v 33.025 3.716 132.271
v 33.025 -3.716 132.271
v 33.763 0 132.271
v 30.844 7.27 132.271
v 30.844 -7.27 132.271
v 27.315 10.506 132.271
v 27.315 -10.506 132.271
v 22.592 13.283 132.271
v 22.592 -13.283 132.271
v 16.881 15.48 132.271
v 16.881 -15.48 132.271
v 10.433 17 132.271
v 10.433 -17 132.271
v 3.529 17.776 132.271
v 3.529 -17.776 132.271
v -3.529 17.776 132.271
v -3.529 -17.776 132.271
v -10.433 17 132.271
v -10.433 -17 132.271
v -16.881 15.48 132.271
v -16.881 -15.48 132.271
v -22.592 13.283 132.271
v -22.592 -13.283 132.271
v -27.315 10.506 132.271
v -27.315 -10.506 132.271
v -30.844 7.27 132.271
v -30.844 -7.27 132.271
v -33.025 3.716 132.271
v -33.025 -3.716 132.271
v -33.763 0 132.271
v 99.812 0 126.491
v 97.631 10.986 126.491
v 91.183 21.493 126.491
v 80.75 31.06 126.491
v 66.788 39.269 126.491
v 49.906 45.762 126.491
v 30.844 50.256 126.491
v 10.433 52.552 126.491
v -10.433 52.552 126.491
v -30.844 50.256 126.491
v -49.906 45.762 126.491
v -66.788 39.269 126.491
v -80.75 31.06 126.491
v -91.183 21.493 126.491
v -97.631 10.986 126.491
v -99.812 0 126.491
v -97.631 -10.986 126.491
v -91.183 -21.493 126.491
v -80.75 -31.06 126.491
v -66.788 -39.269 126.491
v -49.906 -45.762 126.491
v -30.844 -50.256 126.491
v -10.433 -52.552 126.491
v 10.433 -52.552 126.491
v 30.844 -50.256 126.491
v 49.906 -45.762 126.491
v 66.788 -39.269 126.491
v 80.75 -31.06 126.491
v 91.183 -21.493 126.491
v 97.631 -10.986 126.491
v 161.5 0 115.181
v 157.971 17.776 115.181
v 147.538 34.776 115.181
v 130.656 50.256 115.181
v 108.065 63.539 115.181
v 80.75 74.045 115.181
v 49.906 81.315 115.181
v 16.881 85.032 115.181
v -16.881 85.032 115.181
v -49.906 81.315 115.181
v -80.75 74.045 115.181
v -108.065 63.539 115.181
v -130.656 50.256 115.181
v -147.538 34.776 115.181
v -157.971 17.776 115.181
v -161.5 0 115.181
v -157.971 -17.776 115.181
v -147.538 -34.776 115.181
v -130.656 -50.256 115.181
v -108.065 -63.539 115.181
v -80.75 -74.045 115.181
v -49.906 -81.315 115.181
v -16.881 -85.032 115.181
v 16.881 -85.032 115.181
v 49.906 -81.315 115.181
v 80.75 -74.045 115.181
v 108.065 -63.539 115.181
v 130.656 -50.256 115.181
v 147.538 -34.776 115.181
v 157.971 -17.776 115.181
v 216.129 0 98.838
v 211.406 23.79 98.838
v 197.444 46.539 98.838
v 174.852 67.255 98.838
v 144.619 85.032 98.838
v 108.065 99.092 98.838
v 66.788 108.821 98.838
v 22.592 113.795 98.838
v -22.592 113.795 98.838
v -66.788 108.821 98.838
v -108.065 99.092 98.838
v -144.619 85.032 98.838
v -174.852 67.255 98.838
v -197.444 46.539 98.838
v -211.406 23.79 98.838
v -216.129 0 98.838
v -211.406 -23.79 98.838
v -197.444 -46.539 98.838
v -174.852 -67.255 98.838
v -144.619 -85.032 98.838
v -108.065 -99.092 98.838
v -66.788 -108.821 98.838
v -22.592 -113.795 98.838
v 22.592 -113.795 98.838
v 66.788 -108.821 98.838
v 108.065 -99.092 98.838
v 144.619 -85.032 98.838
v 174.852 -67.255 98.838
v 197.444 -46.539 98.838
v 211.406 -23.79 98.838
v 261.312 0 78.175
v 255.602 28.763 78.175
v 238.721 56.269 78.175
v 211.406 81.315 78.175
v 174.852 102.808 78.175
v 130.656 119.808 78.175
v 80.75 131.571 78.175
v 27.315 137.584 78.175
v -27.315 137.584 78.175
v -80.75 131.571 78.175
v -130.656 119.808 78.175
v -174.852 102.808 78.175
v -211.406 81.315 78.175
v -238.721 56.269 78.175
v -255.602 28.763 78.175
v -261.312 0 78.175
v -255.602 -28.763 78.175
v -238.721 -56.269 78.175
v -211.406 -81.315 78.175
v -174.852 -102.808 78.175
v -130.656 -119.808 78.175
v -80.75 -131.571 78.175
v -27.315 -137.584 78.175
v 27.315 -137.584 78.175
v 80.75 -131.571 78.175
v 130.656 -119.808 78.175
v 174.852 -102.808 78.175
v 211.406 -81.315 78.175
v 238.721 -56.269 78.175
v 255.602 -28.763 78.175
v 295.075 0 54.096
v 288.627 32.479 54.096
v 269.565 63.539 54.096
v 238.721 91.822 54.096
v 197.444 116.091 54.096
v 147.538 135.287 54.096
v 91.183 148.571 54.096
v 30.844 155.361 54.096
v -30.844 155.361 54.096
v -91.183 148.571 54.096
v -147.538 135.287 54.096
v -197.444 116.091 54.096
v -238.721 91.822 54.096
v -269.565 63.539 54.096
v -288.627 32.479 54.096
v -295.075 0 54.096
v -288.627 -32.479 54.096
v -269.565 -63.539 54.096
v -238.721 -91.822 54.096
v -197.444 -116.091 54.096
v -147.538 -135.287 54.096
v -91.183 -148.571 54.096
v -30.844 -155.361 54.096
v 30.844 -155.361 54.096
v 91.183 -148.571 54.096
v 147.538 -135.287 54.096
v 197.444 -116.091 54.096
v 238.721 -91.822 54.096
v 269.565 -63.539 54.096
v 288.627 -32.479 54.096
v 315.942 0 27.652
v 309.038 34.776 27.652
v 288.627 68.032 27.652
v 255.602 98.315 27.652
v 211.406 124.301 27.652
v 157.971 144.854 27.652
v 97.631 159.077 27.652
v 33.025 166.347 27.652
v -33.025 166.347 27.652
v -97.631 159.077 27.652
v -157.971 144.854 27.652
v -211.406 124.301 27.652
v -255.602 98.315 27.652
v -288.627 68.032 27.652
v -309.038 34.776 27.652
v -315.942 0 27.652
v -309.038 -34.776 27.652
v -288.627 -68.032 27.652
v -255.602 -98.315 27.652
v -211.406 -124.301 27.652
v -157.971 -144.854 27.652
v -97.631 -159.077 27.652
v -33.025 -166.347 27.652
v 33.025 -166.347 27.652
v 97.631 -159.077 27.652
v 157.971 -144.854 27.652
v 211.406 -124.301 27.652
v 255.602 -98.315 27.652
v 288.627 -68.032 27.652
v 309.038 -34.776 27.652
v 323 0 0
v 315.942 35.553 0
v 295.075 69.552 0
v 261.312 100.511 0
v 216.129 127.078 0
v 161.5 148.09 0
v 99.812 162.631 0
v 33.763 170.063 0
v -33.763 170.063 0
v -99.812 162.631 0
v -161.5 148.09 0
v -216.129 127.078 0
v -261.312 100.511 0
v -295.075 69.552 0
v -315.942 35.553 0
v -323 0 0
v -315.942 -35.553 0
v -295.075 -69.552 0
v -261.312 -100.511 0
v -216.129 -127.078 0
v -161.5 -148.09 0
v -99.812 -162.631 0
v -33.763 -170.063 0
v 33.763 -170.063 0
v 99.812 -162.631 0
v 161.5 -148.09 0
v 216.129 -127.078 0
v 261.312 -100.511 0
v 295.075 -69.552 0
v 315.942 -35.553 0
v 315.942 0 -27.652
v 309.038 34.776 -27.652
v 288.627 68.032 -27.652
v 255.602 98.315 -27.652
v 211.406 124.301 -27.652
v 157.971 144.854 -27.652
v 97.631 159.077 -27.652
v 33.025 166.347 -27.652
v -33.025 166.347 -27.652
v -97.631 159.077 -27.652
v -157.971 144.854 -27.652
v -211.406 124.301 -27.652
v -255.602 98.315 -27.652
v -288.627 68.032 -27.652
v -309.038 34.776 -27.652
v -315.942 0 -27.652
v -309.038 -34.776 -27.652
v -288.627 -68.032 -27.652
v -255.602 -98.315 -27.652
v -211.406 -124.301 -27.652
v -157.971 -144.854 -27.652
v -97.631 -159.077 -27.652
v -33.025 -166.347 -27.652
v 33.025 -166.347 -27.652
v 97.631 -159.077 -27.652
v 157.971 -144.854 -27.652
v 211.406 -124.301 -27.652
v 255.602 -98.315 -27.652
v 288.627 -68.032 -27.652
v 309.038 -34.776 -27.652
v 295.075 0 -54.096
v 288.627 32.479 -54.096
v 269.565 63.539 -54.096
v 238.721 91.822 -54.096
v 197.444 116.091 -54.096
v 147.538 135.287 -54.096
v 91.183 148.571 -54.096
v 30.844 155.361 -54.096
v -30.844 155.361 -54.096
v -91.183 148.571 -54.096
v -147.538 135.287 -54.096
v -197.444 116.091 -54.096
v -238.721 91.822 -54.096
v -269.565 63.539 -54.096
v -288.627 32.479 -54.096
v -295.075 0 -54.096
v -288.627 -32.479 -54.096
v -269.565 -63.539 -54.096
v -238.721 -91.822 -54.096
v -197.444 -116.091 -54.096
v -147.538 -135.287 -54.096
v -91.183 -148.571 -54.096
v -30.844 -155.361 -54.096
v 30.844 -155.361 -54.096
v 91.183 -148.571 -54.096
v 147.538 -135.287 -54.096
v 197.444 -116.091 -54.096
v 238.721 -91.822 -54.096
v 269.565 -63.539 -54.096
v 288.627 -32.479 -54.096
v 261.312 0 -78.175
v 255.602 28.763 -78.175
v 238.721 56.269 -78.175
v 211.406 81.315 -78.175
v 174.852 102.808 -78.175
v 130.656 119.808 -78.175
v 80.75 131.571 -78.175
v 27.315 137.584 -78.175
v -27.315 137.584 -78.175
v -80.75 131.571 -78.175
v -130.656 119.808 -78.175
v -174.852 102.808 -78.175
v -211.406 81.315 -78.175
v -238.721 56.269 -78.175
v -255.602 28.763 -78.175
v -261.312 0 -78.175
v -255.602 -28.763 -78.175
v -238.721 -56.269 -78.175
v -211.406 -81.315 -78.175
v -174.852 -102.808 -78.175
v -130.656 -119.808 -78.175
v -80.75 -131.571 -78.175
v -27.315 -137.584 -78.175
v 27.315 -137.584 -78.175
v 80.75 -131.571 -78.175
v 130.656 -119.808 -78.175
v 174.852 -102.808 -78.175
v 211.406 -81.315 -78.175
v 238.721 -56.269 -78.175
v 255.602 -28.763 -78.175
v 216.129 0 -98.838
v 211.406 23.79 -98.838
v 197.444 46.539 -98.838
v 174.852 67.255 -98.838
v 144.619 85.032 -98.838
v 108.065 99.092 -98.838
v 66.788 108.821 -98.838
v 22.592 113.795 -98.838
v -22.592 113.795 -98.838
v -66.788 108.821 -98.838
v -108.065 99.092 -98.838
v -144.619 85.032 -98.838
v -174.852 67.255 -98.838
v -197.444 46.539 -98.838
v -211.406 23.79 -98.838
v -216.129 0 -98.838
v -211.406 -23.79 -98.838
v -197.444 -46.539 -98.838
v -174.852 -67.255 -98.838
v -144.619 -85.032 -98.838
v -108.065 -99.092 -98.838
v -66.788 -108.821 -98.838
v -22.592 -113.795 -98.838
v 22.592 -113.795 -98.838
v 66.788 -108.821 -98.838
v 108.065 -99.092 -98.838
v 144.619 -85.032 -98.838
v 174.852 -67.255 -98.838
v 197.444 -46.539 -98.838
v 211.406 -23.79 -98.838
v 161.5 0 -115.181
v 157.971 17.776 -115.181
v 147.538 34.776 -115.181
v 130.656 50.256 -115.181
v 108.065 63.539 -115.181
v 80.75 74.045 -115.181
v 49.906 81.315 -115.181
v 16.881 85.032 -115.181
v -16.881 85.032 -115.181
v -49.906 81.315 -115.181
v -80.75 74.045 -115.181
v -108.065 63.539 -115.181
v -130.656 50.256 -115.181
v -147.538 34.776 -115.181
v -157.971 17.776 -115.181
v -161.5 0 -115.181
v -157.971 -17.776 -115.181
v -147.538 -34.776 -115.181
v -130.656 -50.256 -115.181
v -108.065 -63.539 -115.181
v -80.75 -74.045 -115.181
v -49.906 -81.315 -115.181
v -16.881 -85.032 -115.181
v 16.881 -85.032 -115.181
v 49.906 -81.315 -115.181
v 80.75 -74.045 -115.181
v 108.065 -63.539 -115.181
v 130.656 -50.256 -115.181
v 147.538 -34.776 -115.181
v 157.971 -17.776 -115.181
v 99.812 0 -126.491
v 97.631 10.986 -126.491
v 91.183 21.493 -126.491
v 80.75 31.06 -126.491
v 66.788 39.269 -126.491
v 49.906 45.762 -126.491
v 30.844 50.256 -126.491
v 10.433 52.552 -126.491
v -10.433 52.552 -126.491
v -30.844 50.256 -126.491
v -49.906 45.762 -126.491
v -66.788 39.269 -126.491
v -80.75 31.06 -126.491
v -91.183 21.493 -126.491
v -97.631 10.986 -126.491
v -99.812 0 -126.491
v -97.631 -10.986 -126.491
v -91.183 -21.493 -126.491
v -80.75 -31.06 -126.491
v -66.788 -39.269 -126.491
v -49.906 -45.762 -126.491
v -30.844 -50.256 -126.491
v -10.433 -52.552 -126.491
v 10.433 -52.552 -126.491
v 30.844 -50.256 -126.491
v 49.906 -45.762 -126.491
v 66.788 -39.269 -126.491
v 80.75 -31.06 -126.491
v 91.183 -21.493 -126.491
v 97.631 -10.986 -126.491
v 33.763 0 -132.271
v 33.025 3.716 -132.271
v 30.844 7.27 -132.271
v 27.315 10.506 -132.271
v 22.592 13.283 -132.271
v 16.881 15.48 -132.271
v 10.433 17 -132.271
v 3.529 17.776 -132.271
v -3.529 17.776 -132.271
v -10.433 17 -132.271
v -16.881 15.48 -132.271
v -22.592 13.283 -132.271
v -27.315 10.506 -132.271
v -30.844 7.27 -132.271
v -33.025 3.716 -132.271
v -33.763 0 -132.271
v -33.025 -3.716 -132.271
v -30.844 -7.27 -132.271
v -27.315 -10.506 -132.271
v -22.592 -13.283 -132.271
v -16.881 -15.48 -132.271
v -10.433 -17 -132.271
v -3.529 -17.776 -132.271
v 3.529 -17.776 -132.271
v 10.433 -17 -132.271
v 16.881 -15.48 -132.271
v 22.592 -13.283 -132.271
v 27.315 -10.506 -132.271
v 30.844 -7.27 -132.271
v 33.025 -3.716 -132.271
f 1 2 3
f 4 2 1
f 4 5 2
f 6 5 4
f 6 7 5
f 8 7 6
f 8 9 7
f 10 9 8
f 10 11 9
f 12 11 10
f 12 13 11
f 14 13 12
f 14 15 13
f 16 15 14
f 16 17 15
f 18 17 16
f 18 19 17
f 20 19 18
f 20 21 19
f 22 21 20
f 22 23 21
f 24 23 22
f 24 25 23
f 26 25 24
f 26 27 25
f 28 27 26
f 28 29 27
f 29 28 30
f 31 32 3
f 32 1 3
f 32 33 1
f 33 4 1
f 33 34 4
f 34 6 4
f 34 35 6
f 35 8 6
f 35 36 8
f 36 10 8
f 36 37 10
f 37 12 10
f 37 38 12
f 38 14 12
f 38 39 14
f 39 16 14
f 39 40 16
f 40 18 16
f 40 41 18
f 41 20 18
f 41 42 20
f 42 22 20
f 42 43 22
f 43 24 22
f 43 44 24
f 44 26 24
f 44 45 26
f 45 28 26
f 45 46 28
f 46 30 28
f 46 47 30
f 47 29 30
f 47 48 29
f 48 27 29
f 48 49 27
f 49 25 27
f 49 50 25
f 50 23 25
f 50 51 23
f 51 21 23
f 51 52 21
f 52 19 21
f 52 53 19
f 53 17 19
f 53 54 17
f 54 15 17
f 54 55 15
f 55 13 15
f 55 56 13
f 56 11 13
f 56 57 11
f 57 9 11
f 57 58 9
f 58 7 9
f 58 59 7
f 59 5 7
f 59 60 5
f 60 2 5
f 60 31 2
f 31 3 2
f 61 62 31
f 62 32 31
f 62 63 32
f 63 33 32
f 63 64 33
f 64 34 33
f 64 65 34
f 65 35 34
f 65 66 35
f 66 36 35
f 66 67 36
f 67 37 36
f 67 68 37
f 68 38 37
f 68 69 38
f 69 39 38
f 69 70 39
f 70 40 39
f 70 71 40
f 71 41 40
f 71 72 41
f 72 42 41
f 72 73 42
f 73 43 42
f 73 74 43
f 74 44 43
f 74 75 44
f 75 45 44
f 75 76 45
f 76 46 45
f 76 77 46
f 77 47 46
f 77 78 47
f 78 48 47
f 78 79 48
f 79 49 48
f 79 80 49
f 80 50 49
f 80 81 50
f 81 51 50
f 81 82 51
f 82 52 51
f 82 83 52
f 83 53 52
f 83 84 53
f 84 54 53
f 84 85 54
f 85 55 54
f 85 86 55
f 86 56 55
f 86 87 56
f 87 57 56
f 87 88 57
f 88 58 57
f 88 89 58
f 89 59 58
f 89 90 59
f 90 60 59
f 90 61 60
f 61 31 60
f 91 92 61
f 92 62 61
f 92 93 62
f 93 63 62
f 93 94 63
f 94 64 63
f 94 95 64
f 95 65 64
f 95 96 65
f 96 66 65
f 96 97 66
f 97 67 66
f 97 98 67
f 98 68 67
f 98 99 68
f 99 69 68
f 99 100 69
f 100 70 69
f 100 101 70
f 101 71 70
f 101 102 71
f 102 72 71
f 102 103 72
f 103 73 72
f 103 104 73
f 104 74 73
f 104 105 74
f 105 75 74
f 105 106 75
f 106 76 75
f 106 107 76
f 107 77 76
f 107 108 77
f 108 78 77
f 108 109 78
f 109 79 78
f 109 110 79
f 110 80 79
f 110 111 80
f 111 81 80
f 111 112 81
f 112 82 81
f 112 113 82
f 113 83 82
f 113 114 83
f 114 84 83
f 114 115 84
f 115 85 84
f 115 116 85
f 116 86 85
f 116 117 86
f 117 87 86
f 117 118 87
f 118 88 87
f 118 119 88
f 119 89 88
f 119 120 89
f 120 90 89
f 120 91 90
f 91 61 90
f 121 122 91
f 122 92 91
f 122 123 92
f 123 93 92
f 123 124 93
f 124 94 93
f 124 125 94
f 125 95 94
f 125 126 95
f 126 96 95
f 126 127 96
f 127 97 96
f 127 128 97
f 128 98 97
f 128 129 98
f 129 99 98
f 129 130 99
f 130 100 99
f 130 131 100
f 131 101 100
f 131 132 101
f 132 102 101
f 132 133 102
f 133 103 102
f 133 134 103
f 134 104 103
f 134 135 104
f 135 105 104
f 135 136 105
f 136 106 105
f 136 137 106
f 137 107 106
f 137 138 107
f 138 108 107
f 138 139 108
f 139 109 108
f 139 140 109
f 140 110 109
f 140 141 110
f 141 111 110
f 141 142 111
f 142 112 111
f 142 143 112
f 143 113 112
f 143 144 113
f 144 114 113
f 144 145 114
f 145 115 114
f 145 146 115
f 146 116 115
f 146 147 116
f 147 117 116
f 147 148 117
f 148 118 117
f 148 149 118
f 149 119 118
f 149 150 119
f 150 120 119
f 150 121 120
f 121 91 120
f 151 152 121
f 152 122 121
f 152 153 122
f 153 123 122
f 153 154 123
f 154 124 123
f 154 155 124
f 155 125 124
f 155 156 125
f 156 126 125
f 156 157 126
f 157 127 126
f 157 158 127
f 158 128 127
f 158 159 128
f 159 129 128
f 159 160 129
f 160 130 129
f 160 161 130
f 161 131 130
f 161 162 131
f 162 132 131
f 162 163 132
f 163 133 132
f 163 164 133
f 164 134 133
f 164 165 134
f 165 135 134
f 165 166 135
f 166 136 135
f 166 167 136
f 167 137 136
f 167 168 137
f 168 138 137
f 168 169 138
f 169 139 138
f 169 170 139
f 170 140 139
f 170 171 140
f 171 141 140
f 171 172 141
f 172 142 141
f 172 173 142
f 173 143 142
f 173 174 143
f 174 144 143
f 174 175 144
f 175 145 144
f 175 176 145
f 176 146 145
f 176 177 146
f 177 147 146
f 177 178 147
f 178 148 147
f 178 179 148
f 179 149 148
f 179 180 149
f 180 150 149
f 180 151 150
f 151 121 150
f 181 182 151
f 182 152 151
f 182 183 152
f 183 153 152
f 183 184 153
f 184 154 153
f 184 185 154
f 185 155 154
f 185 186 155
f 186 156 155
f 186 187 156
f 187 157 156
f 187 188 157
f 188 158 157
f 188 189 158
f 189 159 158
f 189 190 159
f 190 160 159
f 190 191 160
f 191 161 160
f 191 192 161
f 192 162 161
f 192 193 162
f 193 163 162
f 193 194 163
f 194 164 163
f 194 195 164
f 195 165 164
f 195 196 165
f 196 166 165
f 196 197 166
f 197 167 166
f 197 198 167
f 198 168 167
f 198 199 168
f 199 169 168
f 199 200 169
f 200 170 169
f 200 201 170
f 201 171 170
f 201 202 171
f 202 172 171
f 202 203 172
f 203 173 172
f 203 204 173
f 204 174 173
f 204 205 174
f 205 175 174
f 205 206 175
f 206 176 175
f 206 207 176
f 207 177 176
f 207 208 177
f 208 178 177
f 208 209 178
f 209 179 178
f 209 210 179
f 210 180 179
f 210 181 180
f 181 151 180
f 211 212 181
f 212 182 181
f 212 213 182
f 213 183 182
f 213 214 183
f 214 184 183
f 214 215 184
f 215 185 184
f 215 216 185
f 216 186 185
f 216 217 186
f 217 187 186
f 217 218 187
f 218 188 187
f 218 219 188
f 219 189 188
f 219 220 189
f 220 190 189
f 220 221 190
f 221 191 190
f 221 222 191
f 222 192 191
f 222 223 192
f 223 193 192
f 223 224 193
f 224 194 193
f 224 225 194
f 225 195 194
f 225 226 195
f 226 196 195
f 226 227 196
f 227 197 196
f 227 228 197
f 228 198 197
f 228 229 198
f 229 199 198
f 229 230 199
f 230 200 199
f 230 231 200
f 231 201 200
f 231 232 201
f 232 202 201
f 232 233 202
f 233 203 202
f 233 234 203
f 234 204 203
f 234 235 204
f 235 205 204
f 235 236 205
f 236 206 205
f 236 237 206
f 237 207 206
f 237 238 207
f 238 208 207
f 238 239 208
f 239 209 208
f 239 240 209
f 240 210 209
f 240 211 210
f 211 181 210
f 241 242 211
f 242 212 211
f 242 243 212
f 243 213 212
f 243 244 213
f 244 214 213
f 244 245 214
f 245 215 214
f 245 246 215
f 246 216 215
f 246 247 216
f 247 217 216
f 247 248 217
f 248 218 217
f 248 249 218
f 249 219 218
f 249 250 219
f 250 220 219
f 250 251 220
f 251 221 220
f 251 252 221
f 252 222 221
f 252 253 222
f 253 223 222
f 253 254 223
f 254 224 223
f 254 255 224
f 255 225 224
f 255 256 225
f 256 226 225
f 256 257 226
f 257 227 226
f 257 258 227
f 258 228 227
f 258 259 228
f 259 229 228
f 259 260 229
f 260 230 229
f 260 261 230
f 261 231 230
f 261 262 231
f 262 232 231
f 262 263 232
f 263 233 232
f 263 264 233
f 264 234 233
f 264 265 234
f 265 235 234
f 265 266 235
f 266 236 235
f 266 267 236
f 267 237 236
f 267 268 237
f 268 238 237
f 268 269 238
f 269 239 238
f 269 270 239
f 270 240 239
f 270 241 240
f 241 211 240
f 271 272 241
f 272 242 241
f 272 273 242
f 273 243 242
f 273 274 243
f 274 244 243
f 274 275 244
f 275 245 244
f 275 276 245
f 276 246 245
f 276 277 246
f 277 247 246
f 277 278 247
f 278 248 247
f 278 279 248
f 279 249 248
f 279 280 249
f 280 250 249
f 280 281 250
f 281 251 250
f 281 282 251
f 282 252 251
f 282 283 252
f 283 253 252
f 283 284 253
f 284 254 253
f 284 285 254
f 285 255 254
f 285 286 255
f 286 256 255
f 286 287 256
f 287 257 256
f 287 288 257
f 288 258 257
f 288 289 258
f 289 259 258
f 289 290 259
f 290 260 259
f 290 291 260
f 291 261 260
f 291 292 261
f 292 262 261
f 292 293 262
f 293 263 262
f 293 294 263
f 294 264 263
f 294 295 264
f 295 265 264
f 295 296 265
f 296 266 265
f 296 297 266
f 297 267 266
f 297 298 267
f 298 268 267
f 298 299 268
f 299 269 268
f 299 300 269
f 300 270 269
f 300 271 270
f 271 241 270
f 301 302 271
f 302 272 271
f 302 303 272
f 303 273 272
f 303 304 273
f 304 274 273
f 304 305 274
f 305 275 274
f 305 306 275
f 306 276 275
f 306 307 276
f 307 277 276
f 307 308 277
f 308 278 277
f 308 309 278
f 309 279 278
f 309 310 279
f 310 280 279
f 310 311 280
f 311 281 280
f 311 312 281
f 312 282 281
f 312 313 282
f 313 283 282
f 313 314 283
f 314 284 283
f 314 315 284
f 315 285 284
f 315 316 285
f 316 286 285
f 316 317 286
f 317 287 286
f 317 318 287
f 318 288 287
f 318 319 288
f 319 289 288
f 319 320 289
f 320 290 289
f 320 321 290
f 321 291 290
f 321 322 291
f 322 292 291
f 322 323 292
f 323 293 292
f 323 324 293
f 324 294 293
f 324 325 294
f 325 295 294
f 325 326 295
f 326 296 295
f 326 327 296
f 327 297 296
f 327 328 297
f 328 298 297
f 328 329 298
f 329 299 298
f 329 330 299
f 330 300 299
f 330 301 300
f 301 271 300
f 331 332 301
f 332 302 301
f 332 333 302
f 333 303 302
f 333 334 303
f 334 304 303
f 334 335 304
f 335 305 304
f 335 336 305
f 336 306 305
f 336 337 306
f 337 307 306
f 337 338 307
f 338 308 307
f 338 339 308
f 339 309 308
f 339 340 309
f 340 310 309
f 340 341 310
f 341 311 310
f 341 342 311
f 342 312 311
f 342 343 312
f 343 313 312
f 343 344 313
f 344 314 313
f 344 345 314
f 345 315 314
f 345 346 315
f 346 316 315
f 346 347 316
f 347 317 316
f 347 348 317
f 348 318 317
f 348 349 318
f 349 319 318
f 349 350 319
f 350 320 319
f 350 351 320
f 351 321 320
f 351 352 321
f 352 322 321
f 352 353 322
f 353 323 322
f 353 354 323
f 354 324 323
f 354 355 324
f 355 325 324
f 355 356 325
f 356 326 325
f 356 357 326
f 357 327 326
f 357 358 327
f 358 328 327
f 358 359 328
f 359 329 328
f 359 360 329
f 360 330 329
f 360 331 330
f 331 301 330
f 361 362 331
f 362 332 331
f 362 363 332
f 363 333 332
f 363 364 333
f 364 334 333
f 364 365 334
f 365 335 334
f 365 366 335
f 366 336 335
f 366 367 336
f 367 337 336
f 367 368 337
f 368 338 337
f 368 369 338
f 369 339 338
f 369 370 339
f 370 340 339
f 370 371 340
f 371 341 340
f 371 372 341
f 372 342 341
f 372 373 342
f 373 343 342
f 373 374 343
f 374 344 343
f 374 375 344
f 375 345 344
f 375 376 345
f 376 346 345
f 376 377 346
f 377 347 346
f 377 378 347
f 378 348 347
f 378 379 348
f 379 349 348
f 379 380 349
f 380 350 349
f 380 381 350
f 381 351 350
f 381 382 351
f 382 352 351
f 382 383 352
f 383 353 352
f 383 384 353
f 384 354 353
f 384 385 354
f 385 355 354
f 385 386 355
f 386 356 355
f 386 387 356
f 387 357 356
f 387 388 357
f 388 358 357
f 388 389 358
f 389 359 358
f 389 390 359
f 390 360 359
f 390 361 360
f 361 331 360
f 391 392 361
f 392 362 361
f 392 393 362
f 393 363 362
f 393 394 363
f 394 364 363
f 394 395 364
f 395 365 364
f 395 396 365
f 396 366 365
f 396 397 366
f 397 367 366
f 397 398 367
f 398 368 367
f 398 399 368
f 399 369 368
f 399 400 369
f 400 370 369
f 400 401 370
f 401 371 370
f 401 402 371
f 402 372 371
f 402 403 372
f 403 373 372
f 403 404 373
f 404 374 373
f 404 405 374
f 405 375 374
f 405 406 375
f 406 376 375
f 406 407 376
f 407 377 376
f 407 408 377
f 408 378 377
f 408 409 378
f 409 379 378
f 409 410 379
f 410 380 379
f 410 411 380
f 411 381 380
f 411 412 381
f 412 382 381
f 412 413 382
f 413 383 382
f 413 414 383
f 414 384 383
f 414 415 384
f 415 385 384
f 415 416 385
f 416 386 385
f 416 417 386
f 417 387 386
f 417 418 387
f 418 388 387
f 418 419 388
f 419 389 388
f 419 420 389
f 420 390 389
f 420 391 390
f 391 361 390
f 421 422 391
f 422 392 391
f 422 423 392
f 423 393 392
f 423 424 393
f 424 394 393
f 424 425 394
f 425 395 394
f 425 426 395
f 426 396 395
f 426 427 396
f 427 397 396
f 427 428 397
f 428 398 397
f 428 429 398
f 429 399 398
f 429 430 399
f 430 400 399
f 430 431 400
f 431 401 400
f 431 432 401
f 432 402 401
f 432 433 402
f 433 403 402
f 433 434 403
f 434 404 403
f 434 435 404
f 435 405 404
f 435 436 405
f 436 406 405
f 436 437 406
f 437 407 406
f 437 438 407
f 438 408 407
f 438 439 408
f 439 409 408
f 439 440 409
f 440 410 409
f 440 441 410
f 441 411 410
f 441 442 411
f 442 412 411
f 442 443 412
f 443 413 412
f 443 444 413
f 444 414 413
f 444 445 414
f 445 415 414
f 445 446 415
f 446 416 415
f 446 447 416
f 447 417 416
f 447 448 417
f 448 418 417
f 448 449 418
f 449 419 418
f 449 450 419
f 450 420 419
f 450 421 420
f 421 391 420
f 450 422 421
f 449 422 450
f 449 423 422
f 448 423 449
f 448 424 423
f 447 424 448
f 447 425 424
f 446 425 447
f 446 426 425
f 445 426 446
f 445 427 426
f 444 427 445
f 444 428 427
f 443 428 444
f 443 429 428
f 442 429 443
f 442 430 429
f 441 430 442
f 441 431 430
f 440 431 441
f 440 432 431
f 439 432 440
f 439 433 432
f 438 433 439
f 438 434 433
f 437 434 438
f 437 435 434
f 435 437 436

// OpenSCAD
// Generated by SolidPython 1.0.1 on 2020-07-29 00:46:53


scale(v = [17, 9, 7]) {
	sphere(r = 19);
}
/***********************************************
*********      SolidPython code:      **********
************************************************
 
# import packages: SolidPython
from solid import *
from solid.utils import *
from itertools import chain, combinations, permutations


class Resize:

    def __init__(self, scad_file):
        self.scad_file = scad_file
        #self.scad_file = import_scad(scad_file)
        # cone/cylinder param:
        self.r1 = 0
        self.r2 = 0
        self.h = 0
        # rectangular prism param:
        self.w = 0
        self.l = 0
        # ellipse param:
        self.r = 0

    # import OpenScad code (file name corresponds to shape)


    # classify shape + parameters
    def assign(self, param1, param2, param3):
        if self.scad_file == 'cone.scad':
            self.r1 = param1
            self.r2 = param2
            self.h = param3
        elif self.scad_file == 'cylinder.scad':
            self.r1 = param1
            self.r2 = param2
            self.h = param3
        elif self.scad_file == 'rectangularPrism.scad':
            self.h = param1
            self.l = param2
            self.w = param3
        else:
            self.r = param1
            self.h = param2

    # resize parameters
    def iterate(self):
        x = range(3, 20, 2)
        i = 1
        if self.scad_file == 'cone.scad':
            tempList = list(permutations(x, 2))
            for temp in tempList:
                param1 = temp[0]
                param2 = temp[1]
                filepath = 'produced_scad_files/' + 'cone' + str(param1) + '_' + str(param2) + '_' + '.scad'
                scad_render_to_file(cylinder(h=param1, r1=param2, r2=0), filepath)

        elif self.scad_file == 'cylinder.scad':
            tempList = list(permutations(x, 3))
            for temp in tempList:
                param1 = temp[0]
                param2 = temp[1]
                filepath = 'produced_scad_files/' + 'cylinder' + str(param1) + '_' + str(param2) + '_' + '.scad'
                scad_render_to_file(cylinder(h=param1, r1=param2, r2=param2), filepath)

        elif self.scad_file == 'rectangularPrism.scad':
            tempList = list(permutations(x, 3))
            for temp in tempList:
                param1 = temp[0]
                param2 = temp[1]
                param3 = temp[2]
                filepath = 'produced_scad_files/' + 'rectangularPrism' + str(param1) + '_' + str(param2) + '_' + str(
                    param3) + '.scad'
                scad_render_to_file(cube(size=(param1, param2, param3)), filepath)

        elif self.scad_file == 'ellipse.scad':
            tempList = list(permutations(x, 4))
            for temp in tempList:
                param1 = temp[0]
                param2 = temp[1]
                param3 = temp[2]
                param4 = temp[3]
                filepath = 'produced_scad_files/' + 'ellipse' + str(param1) + '_' + str(param2) + '_' + str(param3) + '_' + str(param4) + '.scad'
                scad_render_to_file(scale([param1, param2, param3])(sphere(r=param4)), filepath)

    def render_to_scadfile(self):
        scad_render_to_file(scad, 'example.scad') 
 
************************************************/
